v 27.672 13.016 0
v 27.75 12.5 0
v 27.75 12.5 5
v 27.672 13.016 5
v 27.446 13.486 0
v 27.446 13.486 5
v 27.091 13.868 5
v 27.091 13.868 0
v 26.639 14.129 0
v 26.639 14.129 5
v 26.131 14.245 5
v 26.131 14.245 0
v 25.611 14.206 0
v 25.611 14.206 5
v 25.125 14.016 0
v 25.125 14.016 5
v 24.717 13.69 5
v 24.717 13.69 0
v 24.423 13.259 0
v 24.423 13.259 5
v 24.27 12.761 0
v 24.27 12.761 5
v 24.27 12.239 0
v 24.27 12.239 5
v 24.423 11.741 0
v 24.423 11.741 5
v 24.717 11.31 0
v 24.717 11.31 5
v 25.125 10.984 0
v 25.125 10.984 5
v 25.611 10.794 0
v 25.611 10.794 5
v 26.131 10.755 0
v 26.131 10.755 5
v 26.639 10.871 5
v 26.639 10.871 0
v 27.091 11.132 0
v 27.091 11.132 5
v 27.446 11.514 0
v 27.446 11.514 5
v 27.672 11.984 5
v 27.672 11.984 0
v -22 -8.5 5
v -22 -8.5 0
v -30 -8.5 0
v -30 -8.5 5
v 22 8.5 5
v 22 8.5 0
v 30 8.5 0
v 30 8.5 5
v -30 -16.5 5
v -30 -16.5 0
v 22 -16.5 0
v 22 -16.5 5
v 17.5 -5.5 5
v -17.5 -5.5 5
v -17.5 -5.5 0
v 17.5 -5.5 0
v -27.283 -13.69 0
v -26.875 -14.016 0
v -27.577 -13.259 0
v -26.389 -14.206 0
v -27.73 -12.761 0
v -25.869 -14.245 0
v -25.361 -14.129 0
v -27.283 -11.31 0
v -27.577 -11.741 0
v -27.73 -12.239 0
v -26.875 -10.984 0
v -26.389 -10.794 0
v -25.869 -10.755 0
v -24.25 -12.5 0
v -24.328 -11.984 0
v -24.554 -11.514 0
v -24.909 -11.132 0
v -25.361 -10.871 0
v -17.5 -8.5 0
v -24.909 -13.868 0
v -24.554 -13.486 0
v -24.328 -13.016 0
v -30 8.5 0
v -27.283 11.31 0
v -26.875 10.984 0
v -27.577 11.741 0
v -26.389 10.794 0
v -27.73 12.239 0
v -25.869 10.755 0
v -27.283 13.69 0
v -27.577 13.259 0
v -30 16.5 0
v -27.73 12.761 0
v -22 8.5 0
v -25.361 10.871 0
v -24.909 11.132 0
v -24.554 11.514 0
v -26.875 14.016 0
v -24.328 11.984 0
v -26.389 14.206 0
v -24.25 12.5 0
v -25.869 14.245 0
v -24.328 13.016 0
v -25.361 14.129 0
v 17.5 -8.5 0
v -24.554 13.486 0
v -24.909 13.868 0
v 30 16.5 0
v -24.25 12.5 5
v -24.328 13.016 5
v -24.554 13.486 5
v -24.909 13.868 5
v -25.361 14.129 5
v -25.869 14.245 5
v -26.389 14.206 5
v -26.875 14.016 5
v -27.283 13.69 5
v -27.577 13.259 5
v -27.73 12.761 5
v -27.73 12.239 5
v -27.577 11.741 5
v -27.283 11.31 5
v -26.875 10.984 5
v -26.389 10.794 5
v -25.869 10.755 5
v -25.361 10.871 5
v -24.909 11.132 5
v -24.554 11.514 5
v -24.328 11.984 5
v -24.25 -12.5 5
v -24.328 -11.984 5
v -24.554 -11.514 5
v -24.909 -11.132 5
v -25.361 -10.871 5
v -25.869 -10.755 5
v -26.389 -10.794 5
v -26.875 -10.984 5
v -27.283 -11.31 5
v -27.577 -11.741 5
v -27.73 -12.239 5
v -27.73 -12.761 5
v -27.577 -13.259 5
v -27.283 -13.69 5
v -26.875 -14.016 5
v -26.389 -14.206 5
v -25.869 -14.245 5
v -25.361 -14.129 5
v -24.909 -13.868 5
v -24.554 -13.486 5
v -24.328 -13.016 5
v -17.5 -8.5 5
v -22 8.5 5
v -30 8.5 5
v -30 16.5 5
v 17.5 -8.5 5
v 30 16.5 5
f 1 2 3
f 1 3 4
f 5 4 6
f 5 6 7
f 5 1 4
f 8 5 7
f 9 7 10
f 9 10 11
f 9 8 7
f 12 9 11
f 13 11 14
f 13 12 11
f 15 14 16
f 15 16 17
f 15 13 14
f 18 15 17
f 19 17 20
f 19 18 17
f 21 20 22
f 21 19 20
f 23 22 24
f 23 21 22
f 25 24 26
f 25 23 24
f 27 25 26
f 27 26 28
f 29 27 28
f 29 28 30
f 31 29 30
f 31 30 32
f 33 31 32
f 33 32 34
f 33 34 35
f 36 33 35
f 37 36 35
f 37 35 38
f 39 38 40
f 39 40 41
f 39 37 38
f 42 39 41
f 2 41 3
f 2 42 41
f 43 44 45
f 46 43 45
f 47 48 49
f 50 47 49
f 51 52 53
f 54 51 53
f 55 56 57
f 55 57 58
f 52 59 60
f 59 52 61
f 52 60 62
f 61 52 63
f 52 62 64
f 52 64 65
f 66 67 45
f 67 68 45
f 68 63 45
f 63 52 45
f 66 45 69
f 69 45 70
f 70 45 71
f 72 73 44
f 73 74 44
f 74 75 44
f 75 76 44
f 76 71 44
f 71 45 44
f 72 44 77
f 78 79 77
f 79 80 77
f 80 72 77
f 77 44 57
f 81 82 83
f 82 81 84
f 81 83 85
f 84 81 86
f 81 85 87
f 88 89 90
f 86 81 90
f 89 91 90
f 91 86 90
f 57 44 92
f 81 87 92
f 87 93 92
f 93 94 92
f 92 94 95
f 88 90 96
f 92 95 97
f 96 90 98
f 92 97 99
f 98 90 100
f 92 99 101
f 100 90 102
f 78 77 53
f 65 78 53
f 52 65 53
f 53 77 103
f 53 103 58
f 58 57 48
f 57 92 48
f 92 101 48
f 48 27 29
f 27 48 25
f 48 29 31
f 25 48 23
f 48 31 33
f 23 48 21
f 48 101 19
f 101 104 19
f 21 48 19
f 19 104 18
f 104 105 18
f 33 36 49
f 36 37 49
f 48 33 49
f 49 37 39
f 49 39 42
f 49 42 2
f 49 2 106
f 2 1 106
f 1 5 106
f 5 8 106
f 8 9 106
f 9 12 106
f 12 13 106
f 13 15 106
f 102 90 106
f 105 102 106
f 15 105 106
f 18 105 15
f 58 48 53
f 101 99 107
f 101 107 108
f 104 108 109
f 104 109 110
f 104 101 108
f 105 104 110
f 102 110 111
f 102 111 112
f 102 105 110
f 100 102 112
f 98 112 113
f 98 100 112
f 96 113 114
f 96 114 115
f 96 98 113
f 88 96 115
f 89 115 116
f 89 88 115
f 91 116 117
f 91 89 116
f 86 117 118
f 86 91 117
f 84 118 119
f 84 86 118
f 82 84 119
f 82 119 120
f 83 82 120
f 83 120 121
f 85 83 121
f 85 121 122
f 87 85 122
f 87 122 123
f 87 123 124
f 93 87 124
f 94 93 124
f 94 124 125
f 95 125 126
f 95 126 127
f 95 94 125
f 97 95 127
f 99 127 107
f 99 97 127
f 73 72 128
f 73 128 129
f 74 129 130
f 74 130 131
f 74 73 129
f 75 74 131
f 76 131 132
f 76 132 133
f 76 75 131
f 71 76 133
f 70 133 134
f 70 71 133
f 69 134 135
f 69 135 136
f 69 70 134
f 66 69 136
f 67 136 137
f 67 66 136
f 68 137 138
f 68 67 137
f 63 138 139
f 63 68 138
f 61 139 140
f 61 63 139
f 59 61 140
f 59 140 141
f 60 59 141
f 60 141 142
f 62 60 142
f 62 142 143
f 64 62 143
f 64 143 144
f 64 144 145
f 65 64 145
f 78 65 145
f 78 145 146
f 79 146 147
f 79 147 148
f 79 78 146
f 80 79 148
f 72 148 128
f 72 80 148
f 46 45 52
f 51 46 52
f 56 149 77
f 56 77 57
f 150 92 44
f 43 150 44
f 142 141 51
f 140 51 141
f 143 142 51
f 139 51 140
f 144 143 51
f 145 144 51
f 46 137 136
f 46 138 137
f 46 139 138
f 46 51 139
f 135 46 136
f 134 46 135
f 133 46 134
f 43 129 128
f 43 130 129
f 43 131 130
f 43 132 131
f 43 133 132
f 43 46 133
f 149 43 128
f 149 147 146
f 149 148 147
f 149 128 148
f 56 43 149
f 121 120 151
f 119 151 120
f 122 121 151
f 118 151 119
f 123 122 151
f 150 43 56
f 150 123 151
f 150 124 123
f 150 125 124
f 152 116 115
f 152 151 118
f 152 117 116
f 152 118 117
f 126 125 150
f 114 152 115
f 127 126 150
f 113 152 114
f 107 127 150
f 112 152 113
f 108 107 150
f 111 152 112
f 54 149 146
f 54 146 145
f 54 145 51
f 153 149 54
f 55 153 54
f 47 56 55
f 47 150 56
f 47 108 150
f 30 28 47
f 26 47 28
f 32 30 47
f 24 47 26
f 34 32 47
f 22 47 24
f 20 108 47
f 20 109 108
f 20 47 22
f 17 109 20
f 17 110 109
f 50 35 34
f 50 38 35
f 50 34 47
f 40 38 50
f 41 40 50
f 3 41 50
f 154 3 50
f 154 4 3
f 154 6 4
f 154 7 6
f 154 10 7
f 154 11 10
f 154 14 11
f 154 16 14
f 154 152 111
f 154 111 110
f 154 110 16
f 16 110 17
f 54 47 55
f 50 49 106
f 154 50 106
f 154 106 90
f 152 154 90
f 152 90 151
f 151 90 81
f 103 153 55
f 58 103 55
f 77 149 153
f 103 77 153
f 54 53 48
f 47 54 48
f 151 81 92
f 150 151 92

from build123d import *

# Parameters (mm, degrees)
SKETCH_1_R          = 1.75
EXTRUDE_1_DEPTH     = 5
CUT_EXTRUDE_1_REACH = 7
SKETCH_2_W          = 35
SKETCH_2_H          = 3
SKETCH_3_W          = 8
SKETCH_3_H          = 8
CUT_EXTRUDE_3_DEPTH = 6


with BuildPart() as part:
    # 草圖1 → 填料-伸長1 (new body)
    with BuildSketch(Plane.XY):
        Polygon((-30, 16.5), (-30, 8.5), (-22, 8.5), (-22, -8.5), (-30, -8.5), (-30, -16.5), (30, -16.5), (30, -8.5), (22, -8.5), (22, 8.5), (30, 8.5), (30, 16.5), align=None)
        with Locations((-26, 12.5)):
            Circle(SKETCH_1_R, mode=Mode.SUBTRACT)
        with Locations((26, 12.5)):
            Circle(SKETCH_1_R, mode=Mode.SUBTRACT)
        with Locations((-26, -12.5)):
            Circle(SKETCH_1_R, mode=Mode.SUBTRACT)
        with Locations((26, -12.5)):
            Circle(SKETCH_1_R, mode=Mode.SUBTRACT)
    extrude(amount=EXTRUDE_1_DEPTH)

    # 草圖2 → 除料-伸長1 (cut, up to next)
    with BuildSketch(Plane.XY.offset(5), mode=Mode.PRIVATE) as cut_extrude_1_sk1:
        with Locations((0, -7)):
            Rectangle(SKETCH_2_W, SKETCH_2_H)
    cut_extrude_1_tool1 = extrude(cut_extrude_1_sk1.sketch, amount=-CUT_EXTRUDE_1_REACH, mode=Mode.PRIVATE) & part.part
    add(cut_extrude_1_tool1.solids().sort_by_distance((0, -7, 5))[0], mode=Mode.SUBTRACT)

    # 草圖3 → 除料-伸長3 (cut, through all)
    with BuildSketch(Plane.XY):
        with Locations((26, -12.5)):
            Rectangle(SKETCH_3_W, SKETCH_3_H)
    extrude(amount=CUT_EXTRUDE_3_DEPTH, mode=Mode.SUBTRACT)


solid = part.part
